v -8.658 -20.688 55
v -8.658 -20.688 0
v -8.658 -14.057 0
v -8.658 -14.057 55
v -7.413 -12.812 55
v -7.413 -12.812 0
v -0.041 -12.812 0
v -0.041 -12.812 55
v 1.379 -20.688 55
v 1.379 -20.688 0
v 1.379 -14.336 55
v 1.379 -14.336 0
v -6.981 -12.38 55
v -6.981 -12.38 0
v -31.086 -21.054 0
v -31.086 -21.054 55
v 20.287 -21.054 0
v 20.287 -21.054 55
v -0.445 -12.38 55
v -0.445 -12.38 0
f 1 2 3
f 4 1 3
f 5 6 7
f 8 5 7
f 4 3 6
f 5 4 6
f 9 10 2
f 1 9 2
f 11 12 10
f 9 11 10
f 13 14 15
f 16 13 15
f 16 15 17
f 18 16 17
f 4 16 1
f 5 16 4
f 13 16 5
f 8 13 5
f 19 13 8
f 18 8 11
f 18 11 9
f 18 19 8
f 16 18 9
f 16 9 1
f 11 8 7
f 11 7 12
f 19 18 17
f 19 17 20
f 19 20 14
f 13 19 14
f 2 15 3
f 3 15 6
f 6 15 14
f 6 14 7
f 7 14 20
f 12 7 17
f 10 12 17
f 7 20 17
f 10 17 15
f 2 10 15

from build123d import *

# Parameters (mm, degrees)
SALIENTE_EXTRUIR1_DEPTH = 55
CORTAR_EXTRUIR1_DEPTH   = 68


with BuildPart() as part:
    # Croquis1 → Saliente-Extruir1 (new body)
    with BuildSketch(Plane.XY):
        Polygon((-7.08566541, -21.054004681), (20.287395509, -21.054004681), (-0.444607291, -12.379909579), (-6.980601691, -12.379909579), (-31.08566541, -21.054004681), align=None)
    extrude(amount=SALIENTE_EXTRUIR1_DEPTH)

    # Croquis2 → Cortar-Extruir1 (cut)
    with BuildSketch(Plane.XY):
        Polygon((-7.413108938, -12.812416826), (-0.041425498, -12.812416826), (1.379269414, -14.336446074), (1.379269414, -20.687882008), (-8.657749406, -20.687882008), (-8.657749406, -14.057057294), align=None)
    extrude(amount=CORTAR_EXTRUIR1_DEPTH, mode=Mode.SUBTRACT)


solid = part.part
